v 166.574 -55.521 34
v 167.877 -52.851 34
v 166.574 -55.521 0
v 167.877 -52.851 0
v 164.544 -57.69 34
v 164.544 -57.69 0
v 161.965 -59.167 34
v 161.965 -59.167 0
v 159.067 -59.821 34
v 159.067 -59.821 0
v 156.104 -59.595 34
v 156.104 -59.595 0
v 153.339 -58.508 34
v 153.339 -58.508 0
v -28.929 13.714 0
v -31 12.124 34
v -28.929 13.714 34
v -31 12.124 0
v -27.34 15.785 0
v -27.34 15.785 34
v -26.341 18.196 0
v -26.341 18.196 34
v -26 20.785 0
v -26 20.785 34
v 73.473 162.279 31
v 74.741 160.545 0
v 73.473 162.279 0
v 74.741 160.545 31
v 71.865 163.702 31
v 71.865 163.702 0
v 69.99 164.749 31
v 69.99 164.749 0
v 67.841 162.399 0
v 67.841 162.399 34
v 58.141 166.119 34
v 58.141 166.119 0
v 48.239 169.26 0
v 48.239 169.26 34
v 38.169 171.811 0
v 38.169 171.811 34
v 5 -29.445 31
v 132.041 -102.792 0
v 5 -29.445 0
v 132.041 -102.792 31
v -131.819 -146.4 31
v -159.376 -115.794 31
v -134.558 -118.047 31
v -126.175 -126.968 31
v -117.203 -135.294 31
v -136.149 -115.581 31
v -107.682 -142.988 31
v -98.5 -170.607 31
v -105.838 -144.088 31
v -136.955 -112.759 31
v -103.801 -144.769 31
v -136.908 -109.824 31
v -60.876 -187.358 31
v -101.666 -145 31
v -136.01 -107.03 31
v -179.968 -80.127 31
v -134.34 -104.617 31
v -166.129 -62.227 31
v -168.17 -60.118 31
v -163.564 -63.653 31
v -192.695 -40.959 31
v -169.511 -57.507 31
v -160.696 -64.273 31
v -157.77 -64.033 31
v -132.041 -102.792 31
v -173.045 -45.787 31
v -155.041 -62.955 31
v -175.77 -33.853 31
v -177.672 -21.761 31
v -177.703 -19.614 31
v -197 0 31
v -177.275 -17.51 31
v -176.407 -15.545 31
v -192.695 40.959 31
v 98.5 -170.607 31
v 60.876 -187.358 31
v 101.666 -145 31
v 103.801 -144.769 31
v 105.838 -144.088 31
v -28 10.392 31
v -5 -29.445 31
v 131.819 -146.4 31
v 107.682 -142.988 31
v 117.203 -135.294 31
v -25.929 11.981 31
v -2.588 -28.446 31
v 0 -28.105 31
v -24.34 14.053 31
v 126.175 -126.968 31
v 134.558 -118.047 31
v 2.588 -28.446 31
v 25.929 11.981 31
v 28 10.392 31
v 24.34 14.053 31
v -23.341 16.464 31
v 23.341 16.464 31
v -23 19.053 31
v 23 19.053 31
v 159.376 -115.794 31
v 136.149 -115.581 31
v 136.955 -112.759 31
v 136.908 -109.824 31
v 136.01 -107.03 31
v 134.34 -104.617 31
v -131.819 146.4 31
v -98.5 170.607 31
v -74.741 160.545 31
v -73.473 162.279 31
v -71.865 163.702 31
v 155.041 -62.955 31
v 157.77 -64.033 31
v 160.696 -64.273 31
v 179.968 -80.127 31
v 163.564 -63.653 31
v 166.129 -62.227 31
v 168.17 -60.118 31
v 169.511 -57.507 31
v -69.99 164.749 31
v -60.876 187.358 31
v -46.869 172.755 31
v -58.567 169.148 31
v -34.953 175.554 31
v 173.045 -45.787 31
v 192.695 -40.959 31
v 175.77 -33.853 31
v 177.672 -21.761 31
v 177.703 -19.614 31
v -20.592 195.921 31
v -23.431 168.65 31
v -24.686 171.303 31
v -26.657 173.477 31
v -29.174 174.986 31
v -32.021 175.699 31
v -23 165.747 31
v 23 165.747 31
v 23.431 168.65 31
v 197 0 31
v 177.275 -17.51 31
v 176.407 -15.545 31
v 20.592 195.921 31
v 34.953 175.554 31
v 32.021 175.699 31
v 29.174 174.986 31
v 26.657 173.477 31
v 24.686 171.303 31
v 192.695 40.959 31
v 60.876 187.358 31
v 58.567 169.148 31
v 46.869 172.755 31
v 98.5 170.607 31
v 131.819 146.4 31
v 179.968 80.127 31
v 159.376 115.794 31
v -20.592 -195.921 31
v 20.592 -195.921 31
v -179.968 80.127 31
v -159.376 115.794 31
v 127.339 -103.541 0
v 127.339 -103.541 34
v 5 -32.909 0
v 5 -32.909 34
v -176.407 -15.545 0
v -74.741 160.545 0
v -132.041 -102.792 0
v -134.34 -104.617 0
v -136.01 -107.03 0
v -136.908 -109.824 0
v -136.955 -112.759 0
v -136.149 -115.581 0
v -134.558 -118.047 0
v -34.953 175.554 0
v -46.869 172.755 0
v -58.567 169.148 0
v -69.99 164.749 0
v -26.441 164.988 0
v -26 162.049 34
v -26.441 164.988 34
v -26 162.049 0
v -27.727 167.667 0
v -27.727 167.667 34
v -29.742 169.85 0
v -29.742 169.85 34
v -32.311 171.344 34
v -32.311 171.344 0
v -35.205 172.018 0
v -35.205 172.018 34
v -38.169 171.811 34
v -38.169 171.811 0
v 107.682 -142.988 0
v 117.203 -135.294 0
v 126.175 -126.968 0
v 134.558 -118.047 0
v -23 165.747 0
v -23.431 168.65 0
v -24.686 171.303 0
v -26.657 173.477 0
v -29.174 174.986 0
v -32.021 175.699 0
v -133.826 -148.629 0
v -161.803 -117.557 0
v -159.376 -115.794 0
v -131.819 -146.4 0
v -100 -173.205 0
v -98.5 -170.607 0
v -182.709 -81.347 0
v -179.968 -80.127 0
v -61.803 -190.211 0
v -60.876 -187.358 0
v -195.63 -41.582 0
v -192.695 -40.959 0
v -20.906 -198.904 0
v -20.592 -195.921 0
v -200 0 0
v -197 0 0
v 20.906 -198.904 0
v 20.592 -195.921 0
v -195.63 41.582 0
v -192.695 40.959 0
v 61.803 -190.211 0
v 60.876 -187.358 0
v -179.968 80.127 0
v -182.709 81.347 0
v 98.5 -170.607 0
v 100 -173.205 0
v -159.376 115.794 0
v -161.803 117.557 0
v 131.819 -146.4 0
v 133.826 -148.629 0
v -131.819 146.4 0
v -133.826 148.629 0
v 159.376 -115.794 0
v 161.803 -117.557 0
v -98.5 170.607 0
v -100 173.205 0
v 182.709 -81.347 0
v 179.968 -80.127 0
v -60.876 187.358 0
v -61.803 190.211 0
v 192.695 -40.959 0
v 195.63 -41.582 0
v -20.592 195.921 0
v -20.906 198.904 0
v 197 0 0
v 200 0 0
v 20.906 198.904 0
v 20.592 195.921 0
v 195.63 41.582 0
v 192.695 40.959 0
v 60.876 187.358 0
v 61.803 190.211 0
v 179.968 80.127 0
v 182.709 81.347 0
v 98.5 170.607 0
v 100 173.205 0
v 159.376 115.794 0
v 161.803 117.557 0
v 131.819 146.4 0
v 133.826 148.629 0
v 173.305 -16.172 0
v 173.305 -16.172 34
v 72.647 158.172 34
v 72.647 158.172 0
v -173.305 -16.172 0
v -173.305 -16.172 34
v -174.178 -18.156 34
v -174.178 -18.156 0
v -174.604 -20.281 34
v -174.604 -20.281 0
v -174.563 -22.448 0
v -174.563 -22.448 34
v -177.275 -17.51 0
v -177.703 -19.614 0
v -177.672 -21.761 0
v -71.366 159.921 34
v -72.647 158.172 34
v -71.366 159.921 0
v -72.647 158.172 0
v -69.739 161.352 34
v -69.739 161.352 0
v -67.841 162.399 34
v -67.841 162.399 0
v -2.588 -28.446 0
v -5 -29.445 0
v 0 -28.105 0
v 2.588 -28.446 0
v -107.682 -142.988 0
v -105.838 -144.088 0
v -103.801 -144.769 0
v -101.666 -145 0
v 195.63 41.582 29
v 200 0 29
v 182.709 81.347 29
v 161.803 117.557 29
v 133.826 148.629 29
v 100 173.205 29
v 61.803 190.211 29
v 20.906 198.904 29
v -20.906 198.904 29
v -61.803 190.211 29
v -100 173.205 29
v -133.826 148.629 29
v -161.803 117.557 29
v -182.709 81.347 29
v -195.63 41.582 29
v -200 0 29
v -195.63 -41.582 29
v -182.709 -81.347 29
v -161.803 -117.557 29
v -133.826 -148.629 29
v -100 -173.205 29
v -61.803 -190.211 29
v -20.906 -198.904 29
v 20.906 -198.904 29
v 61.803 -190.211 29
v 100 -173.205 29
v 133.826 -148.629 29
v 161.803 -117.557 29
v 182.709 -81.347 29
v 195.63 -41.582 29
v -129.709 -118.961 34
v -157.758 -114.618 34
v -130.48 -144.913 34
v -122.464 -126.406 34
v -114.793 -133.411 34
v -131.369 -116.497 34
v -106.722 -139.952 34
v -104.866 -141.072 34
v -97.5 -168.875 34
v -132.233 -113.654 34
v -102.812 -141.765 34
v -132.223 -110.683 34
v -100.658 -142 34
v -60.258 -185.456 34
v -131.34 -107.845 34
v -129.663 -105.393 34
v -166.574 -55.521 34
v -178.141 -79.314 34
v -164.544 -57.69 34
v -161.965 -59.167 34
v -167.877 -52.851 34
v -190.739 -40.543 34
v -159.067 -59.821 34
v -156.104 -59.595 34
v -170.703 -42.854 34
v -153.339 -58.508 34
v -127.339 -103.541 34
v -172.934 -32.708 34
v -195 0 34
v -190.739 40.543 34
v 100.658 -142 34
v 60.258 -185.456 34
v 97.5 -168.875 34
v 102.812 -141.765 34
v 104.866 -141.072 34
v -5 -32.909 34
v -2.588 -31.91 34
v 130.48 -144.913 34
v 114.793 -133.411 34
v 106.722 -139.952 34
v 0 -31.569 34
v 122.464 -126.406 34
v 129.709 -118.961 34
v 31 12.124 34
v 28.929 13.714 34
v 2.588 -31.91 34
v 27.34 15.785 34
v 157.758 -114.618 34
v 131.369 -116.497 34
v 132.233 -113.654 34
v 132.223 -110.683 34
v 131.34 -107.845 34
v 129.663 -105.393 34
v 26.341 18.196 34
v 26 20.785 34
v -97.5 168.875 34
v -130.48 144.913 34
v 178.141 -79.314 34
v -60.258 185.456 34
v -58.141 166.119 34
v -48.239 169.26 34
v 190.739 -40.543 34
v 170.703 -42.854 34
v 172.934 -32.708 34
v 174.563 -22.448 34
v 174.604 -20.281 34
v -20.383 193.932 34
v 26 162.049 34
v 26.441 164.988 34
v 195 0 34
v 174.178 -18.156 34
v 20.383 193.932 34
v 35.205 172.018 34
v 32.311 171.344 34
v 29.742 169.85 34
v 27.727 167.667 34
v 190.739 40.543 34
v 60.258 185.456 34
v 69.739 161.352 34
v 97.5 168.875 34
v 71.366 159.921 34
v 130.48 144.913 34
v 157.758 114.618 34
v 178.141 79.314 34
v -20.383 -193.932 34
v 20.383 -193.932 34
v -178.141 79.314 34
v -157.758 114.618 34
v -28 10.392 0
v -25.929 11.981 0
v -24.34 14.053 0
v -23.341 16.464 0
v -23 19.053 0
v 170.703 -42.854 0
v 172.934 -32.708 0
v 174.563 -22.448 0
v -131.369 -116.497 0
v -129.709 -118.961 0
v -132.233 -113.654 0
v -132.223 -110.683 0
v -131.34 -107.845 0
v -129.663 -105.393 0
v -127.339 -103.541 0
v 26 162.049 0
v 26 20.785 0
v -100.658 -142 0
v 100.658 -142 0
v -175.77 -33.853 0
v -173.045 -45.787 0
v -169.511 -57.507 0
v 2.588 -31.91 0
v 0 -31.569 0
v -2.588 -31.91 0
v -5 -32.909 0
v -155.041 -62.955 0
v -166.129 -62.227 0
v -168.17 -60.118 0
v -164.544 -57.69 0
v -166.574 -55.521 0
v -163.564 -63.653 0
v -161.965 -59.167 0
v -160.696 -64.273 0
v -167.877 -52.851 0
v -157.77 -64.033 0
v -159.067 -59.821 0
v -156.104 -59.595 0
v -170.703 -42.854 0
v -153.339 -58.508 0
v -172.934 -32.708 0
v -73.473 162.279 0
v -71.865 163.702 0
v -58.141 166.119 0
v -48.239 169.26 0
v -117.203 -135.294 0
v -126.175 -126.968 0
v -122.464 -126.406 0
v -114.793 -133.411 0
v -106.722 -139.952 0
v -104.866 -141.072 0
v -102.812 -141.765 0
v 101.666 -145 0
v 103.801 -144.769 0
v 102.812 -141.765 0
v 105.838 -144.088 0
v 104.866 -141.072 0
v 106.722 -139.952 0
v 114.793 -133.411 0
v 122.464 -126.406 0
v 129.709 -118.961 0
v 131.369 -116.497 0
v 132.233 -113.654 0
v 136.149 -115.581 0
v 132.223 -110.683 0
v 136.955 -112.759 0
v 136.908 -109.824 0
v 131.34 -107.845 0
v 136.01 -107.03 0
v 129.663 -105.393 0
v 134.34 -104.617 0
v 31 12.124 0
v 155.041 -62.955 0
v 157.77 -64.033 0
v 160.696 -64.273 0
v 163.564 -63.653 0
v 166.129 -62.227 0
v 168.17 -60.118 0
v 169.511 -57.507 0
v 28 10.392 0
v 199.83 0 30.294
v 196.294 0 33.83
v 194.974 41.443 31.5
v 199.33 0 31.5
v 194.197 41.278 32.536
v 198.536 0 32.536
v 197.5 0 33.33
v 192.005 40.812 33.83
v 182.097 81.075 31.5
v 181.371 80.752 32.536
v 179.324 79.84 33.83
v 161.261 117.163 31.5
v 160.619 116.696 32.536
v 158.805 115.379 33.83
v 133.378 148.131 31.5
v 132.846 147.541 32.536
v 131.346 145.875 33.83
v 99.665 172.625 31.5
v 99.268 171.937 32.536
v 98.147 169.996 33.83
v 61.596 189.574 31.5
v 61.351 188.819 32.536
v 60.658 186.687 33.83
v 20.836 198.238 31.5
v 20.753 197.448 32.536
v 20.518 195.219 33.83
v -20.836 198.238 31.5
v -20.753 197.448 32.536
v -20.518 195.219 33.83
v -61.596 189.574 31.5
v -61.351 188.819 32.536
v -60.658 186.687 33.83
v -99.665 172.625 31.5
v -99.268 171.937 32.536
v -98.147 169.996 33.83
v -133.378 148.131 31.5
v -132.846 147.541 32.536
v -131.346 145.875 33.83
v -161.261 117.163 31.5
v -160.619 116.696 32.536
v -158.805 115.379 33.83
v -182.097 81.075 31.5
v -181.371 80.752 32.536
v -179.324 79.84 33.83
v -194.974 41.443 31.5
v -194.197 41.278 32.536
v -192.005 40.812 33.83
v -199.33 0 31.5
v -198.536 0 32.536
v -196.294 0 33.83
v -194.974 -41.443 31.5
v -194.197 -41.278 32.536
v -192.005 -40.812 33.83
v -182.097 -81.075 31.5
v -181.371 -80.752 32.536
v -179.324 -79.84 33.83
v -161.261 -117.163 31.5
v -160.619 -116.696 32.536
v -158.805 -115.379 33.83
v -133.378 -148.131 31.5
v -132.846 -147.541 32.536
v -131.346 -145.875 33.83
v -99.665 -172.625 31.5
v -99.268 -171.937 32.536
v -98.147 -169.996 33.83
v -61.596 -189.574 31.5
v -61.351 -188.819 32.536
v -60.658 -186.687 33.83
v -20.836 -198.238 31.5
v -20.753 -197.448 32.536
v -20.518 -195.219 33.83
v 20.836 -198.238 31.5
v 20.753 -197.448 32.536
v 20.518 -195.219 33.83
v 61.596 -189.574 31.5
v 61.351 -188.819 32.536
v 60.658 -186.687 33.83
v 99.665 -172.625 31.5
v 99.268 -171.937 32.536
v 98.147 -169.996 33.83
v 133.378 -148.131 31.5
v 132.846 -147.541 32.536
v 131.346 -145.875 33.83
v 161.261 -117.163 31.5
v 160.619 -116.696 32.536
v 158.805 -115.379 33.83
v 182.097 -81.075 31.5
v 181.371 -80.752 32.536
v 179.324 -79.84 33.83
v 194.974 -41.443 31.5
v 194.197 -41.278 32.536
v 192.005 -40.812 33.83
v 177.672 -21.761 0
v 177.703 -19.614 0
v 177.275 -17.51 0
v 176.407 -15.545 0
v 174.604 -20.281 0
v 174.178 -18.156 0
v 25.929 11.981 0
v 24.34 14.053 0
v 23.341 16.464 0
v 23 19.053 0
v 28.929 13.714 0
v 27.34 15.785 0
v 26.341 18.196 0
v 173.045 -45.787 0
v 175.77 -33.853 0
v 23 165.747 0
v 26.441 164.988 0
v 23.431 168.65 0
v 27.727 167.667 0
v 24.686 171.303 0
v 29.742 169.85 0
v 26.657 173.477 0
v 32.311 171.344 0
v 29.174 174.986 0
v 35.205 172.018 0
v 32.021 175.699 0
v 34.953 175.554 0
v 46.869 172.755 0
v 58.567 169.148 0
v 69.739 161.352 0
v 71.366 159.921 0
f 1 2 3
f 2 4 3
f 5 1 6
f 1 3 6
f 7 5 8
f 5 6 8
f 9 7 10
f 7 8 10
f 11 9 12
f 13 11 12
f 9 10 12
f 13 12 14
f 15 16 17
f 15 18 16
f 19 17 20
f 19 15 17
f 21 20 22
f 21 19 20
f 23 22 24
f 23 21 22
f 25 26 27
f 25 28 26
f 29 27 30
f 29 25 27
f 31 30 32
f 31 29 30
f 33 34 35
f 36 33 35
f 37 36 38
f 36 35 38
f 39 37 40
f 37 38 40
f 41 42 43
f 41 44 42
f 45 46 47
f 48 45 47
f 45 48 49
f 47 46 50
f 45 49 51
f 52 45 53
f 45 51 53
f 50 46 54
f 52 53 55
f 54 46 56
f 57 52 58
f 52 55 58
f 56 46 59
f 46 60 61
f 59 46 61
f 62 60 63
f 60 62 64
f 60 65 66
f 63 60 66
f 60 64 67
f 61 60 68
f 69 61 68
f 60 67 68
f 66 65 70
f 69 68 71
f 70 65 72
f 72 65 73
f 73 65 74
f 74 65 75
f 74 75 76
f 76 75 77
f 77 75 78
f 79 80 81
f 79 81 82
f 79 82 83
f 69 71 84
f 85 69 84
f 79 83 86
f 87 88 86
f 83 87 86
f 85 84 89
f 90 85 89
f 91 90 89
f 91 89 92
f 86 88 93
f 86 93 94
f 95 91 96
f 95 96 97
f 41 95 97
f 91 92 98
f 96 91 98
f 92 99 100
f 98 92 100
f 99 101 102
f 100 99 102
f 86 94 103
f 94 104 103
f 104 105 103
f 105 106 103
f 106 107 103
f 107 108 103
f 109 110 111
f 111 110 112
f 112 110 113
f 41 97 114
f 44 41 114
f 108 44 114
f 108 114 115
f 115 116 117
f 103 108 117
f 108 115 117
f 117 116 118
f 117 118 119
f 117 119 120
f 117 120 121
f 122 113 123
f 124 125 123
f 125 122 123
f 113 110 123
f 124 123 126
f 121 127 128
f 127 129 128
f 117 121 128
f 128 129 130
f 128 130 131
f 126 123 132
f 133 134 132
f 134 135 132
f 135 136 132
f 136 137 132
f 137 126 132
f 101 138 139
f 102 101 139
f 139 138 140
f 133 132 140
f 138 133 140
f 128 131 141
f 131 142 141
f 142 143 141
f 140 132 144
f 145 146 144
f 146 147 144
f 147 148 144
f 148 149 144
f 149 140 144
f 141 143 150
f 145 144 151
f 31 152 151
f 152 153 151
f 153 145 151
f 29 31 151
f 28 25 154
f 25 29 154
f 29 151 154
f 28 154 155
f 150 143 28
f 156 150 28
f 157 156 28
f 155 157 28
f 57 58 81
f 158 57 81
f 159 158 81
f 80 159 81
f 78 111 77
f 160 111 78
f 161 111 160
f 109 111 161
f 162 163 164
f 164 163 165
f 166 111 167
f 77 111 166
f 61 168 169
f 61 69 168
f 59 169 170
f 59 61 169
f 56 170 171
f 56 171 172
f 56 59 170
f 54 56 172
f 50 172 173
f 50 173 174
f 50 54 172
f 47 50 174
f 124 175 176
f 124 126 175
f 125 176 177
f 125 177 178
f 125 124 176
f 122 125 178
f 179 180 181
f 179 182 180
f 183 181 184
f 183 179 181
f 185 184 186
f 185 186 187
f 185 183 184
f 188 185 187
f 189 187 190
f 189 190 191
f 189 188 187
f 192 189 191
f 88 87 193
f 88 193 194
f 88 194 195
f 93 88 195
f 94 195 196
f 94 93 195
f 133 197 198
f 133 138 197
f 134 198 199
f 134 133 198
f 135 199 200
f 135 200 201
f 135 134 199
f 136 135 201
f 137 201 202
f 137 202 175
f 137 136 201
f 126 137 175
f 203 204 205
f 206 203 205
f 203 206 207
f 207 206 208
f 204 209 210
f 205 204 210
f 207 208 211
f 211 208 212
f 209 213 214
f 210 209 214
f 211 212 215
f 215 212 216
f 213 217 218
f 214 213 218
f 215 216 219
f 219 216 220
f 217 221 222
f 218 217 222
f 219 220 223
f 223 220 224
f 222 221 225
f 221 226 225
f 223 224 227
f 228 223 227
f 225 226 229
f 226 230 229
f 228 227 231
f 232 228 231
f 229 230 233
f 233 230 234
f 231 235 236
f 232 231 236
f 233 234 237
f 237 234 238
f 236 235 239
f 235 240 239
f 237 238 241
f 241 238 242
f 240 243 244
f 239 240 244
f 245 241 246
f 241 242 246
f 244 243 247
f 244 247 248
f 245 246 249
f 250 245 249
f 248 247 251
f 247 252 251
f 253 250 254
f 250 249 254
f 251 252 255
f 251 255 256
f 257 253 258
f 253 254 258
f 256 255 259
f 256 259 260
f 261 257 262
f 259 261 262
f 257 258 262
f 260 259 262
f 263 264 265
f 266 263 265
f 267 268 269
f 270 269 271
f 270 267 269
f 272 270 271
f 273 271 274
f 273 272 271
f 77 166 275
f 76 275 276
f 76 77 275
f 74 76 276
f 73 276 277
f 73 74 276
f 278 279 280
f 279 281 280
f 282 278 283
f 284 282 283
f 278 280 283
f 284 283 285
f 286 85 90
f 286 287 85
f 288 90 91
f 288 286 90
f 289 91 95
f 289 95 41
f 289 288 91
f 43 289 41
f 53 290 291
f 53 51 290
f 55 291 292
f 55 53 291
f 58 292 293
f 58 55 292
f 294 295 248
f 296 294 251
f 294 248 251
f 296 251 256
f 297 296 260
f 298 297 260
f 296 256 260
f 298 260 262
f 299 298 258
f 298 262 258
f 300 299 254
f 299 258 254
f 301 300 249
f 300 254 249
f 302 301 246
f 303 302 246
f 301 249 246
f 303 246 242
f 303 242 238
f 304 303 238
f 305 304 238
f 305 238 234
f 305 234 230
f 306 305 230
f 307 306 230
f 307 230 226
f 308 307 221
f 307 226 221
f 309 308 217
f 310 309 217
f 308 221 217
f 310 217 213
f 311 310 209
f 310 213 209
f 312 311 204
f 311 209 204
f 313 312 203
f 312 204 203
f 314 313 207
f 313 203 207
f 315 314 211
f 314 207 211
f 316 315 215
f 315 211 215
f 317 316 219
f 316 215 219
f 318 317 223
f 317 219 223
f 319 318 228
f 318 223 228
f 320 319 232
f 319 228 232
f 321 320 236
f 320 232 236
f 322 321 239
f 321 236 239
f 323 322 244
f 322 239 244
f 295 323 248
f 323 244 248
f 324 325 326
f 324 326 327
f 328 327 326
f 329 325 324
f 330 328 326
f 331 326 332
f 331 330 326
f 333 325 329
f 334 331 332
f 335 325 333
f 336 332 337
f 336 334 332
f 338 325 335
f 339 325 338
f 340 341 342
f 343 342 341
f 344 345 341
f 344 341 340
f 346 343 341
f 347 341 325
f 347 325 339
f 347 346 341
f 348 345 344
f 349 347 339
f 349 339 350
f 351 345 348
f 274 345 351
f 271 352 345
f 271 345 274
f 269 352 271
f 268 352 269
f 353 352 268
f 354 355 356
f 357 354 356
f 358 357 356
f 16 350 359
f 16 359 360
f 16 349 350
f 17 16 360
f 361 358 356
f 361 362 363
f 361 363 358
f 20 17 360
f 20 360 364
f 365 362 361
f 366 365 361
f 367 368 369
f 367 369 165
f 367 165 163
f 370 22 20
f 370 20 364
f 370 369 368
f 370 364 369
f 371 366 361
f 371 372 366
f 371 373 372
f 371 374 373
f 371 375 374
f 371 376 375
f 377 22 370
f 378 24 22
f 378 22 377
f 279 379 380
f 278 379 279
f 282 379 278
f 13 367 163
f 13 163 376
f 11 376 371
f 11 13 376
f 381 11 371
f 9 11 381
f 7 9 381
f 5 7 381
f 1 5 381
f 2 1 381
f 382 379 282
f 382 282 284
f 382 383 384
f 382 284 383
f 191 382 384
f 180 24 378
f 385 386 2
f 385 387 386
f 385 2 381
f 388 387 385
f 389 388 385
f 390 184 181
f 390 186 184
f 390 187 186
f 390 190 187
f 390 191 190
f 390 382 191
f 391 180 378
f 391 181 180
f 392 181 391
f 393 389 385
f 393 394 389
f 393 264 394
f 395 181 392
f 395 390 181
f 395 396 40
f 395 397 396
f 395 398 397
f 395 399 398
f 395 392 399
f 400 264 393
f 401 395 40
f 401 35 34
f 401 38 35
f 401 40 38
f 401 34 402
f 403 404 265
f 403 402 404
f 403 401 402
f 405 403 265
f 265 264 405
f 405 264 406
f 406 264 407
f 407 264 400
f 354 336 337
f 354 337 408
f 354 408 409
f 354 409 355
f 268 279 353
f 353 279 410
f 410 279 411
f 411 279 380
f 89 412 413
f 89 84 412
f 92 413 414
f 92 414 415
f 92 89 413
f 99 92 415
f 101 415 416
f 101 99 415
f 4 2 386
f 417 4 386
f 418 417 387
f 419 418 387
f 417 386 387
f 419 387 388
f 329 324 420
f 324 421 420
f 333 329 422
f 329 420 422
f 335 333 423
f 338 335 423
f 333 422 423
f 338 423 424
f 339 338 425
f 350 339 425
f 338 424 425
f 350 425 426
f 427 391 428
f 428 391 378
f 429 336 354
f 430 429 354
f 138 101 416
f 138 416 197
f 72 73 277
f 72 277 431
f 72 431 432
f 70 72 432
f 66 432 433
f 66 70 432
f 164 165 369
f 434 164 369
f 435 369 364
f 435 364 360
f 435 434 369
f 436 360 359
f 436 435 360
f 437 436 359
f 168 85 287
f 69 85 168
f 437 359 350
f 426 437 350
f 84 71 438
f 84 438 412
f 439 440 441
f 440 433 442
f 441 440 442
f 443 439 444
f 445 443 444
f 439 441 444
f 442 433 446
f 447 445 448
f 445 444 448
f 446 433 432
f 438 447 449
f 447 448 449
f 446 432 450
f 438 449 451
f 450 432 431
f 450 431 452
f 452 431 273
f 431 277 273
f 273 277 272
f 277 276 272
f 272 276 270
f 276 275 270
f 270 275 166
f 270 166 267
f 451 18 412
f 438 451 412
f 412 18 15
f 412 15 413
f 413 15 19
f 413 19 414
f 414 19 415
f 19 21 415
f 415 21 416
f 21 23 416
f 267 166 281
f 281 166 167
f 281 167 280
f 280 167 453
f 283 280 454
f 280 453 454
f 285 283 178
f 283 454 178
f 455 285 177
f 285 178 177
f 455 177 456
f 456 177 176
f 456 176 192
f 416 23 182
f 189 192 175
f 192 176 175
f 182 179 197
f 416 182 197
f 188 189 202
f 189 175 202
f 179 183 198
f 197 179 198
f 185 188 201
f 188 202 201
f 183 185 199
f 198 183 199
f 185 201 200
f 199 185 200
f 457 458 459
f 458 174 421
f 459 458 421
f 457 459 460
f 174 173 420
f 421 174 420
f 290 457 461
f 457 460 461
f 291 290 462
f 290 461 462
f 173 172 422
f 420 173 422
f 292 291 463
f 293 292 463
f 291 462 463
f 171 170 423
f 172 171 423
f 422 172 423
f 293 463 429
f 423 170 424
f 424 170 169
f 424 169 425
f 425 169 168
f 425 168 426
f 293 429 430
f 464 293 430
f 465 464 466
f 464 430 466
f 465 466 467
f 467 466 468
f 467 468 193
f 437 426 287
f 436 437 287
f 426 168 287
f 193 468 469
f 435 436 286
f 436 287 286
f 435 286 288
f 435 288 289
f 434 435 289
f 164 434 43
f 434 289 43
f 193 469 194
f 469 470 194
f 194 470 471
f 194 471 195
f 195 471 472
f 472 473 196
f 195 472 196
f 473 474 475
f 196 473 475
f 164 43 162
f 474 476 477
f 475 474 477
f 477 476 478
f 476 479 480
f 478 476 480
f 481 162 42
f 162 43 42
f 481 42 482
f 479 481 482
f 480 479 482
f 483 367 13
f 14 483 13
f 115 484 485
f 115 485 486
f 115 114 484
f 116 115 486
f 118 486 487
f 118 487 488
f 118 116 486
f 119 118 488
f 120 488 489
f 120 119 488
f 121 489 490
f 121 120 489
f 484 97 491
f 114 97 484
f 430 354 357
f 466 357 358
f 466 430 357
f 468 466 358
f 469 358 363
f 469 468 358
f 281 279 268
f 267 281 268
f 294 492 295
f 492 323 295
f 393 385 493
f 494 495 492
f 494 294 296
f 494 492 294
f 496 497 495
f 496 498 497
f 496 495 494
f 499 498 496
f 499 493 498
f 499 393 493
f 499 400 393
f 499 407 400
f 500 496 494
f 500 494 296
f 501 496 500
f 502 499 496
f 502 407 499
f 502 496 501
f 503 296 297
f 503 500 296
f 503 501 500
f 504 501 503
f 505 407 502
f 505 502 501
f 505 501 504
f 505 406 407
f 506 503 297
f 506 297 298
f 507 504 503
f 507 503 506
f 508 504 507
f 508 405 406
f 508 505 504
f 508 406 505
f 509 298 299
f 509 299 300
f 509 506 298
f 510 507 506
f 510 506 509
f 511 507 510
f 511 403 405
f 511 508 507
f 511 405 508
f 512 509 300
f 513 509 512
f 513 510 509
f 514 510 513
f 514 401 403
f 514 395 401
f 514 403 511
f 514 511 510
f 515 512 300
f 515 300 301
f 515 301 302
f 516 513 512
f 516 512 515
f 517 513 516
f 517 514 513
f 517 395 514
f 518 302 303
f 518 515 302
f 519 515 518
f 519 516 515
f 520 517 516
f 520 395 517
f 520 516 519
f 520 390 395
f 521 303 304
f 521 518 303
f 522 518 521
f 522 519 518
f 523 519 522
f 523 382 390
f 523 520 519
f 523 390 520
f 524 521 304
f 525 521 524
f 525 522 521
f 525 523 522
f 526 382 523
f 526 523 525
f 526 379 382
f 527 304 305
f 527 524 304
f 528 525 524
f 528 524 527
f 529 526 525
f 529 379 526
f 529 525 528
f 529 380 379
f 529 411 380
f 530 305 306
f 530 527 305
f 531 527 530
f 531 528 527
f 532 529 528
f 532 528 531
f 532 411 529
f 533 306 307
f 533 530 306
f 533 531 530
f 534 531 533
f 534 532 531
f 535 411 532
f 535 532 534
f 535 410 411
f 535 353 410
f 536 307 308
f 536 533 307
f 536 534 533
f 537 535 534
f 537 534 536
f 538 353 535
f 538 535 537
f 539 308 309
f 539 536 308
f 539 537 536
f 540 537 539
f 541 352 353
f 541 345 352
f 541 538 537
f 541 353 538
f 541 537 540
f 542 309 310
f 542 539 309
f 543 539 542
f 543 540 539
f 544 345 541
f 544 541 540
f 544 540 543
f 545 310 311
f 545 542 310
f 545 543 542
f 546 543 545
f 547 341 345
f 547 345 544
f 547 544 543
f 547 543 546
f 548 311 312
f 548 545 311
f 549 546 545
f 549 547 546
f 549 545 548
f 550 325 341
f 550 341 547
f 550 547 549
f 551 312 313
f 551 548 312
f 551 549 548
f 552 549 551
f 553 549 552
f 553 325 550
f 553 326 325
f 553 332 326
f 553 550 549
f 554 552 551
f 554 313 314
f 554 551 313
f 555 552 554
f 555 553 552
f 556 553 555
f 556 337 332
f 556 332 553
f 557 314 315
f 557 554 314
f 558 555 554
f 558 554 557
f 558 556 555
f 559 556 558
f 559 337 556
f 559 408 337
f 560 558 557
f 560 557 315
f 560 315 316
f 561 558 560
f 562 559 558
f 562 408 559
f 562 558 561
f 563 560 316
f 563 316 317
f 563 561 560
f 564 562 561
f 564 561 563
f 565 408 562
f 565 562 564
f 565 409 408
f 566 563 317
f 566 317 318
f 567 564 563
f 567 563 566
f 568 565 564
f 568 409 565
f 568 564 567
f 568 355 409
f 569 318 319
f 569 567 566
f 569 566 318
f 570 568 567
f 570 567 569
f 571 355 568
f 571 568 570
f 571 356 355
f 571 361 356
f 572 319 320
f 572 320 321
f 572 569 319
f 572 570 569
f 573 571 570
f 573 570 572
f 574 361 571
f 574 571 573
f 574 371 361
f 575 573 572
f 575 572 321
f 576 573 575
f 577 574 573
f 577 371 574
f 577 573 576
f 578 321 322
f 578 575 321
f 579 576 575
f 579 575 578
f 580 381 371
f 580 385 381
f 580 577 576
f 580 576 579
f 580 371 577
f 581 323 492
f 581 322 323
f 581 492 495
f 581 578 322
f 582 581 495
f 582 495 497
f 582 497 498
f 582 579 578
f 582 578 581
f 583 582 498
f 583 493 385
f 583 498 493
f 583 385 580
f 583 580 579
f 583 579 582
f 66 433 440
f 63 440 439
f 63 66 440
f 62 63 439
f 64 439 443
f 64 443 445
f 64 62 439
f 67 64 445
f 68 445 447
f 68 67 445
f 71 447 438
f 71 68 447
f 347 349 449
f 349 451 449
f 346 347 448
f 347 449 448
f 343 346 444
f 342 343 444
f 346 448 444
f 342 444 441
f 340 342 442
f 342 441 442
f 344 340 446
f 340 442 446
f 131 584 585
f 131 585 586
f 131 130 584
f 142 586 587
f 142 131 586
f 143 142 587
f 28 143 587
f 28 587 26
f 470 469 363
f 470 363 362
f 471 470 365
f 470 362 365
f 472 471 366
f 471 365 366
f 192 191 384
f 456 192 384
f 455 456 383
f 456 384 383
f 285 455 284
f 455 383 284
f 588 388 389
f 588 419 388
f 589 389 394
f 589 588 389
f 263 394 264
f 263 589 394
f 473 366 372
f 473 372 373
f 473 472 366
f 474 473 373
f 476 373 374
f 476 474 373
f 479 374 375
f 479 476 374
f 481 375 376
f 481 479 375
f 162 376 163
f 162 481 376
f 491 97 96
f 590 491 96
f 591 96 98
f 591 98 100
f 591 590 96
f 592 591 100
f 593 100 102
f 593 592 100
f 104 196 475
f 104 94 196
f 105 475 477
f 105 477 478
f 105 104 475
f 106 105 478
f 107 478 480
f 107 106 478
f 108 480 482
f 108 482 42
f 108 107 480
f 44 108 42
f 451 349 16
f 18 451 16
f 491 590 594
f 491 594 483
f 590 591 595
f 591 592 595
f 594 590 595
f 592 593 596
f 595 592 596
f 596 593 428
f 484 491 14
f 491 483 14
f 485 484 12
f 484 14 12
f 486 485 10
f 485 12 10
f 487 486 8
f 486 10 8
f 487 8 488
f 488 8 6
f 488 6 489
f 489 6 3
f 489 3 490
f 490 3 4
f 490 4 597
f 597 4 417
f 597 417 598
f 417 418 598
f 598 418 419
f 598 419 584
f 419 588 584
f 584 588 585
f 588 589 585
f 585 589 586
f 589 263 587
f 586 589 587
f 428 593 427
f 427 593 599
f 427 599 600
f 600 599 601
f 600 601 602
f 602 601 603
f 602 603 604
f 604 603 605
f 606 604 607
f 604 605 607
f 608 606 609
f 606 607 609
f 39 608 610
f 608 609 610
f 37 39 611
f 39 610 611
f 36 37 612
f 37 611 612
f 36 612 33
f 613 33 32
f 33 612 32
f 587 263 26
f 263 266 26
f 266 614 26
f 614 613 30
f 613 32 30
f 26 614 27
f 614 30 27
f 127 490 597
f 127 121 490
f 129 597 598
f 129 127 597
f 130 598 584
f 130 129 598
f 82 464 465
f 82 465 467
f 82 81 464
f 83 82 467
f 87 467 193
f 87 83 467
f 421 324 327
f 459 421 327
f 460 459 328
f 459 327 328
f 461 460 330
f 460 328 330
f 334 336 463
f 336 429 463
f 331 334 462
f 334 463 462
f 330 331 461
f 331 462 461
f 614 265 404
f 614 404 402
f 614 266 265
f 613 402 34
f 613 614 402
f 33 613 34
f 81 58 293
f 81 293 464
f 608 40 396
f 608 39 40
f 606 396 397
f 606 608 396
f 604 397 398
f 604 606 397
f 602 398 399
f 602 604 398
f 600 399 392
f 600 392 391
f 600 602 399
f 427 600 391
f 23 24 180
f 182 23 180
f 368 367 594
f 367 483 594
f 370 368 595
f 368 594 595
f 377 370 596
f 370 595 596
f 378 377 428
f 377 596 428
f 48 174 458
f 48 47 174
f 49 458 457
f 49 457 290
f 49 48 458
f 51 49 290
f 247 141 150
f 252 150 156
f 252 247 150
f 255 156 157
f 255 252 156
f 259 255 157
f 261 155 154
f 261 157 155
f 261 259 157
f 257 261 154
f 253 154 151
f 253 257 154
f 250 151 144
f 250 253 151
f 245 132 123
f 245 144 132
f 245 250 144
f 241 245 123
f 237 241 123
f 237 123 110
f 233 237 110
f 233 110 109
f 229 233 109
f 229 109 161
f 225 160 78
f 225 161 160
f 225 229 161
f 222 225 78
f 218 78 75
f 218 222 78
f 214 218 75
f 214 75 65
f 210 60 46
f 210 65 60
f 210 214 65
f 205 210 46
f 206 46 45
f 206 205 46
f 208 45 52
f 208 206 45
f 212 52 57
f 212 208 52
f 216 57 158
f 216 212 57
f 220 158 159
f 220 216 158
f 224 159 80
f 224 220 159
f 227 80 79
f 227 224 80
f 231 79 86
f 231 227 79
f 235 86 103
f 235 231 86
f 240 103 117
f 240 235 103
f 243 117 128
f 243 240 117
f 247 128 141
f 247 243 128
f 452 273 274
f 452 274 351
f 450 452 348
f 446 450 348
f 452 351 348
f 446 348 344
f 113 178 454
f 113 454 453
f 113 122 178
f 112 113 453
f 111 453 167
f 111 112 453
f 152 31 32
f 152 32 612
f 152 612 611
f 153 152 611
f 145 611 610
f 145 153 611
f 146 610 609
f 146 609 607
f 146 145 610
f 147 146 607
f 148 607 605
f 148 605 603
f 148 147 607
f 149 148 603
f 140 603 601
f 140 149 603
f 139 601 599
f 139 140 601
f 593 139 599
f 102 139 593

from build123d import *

# Parameters (mm, degrees)
ESBO_O2_R             = 200
EXTRUS_O2_DEPTH       = 34
EXTRUS_O3_DEPTH       = 35
PADR_OCIRCULAR1_COUNT = 3
CASCA1_T              = -3
FILETE1_R             = 10
FILETE2_R             = 10
FILETE3_R             = 10
FILETE4_R             = 10
FILETE5_R             = 10
FILETE6_R             = 10
FILETE7_R             = 10
FILETE8_R             = 10
FILETE9_R             = 10
FILETE10_R            = 10
FILETE11_R            = 10
FILETE12_R            = 10
FILETE13_R            = 10
FILETE14_R            = 10
FILETE15_R            = 10
FILETE16_R            = 10
FILETE17_R            = 10
FILETE18_R            = 10
FILETE19_R            = 5


with BuildPart() as part:
    # Esboço2 → Extrusão2 (new body)
    with BuildSketch(Plane.XY):
        Circle(ESBO_O2_R)
    extrude(amount=EXTRUS_O2_DEPTH)

    # Esboço4 → Extrusão3 (cut, through all)
    with BuildSketch(Plane.XY.offset(34)):
        with BuildLine():
            Line((-103.980767452, -142), (103.980767452, -142))
            ThreePointArc((103.980767452, -142), (121.948545192, -126.903712812), (137.748134317, -109.551136426))
            Line((137.748134317, -109.551136426), (0, -30.022213998))
            Line((0, -30.022213998), (-137.748134317, -109.551136426))
            ThreePointArc((-137.748134317, -109.551136426), (-121.948545192, -126.903712812), (-103.980767452, -142))
        make_face()
    extrus_o3 = extrude(amount=-EXTRUS_O3_DEPTH, mode=Mode.SUBTRACT)

    # PadrãoCircular1: Extrusão3 ×3 about axis
    padr_ocircular1_axis = Axis((0, 0, 0), (0, 0, 1))
    for i in range(1, PADR_OCIRCULAR1_COUNT):
        add(extrus_o3.rotate(padr_ocircular1_axis, i * 360 / PADR_OCIRCULAR1_COUNT), mode=Mode.SUBTRACT)

    # Casca1
    casca1_openings = [part.faces().sort_by_distance(p)[0] for p in [
        (92.730670551, 53.538077605, 0),
    ]]
    offset(amount=CASCA1_T, openings=casca1_openings, kind=Kind.INTERSECTION)

    # Filete1
    filete1_edges = [part.edges().sort_by_distance(p)[0] for p in [
        (-137.748134317, -109.551136426, 17),
    ]]
    fillet(filete1_edges, radius=FILETE1_R)

    # Filete2
    filete2_edges = [part.edges().sort_by_distance(p)[0] for p in [
        (137.748134317, -109.551136426, 17),
    ]]
    fillet(filete2_edges, radius=FILETE2_R)

    # Filete3
    filete3_edges = [part.edges().sort_by_distance(p)[0] for p in [
        (-26, 174.068951855, 17),
    ]]
    fillet(filete3_edges, radius=FILETE3_R)

    # Filete4
    filete4_edges = [part.edges().sort_by_distance(p)[0] for p in [
        (-163.748134317, -64.517815429, 17),
    ]]
    fillet(filete4_edges, radius=FILETE4_R)

    # Filete5
    filete5_edges = [part.edges().sort_by_distance(p)[0] for p in [
        (26, 174.068951855, 17),
    ]]
    fillet(filete5_edges, radius=FILETE5_R)

    # Filete6
    filete6_edges = [part.edges().sort_by_distance(p)[0] for p in [
        (163.748134317, -64.517815429, 17),
    ]]
    fillet(filete6_edges, radius=FILETE6_R)

    # Filete7
    filete7_edges = [part.edges().sort_by_distance(p)[0] for p in [
        (0, -30.022213998, 17),
    ]]
    fillet(filete7_edges, radius=FILETE7_R)

    # Filete8
    filete8_edges = [part.edges().sort_by_distance(p)[0] for p in [
        (-26, 15.011106999, 17),
    ]]
    fillet(filete8_edges, radius=FILETE8_R)

    # Filete9
    filete9_edges = [part.edges().sort_by_distance(p)[0] for p in [
        (26, 15.011106999, 17),
    ]]
    fillet(filete9_edges, radius=FILETE9_R)

    # Filete10
    filete10_edges = [part.edges().sort_by_distance(p)[0] for p in [
        (-70.985223611, 161.049986119, 17),
    ]]
    fillet(filete10_edges, radius=FILETE10_R)

    # Filete11
    filete11_edges = [part.edges().sort_by_distance(p)[0] for p in [
        (-174.965991064, -19.049986119, 17),
    ]]
    fillet(filete11_edges, radius=FILETE11_R)

    # Filete12
    filete12_edges = [part.edges().sort_by_distance(p)[0] for p in [
        (-103.980767452, -142, 17),
    ]]
    fillet(filete12_edges, radius=FILETE12_R)

    # Filete13
    filete13_edges = [part.edges().sort_by_distance(p)[0] for p in [
        (103.980767452, -142, 17),
    ]]
    fillet(filete13_edges, radius=FILETE13_R)

    # Filete14
    filete14_edges = [part.edges().sort_by_distance(p)[0] for p in [
        (174.965991064, -19.049986119, 17),
    ]]
    fillet(filete14_edges, radius=FILETE14_R)

    # Filete15
    filete15_edges = [part.edges().sort_by_distance(p)[0] for p in [
        (70.985223611, 161.049986119, 17),
    ]]
    fillet(filete15_edges, radius=FILETE15_R)

    # Filete16
    filete16_edges = [part.edges().sort_by_distance(p)[0] for p in [
        (-142.233535704, -108.676682509, 15.5),
        (0, -26.558112383, 15.5),
        (-104.957134107, -145, 15.5),
        (-165.233535704, -68.839513935, 15.5),
        (-178.052250602, -18.395544445, 15.5),
        (-73.095116495, 163.395544445, 15.5),
        (165.233535704, -68.839513935, 15.5),
        (23, 13.279056191, 15.5),
        (23, 177.516196444, 15.5),
    ]]
    fillet(filete16_edges, radius=FILETE16_R)

    # Filete17
    filete17_edges = [part.edges().sort_by_distance(p)[0] for p in [
        (142.233535704, -108.676682509, 15.5),
        (104.957134107, -145, 15.5),
        (-23, 177.516196444, 15.5),
        (-23, 13.279056191, 15.5),
    ]]
    fillet(filete17_edges, radius=FILETE17_R)

    # Filete18
    filete18_edges = [part.edges().sort_by_distance(p)[0] for p in [
        (73.095116495, 163.395544445, 15.5),
        (178.052250602, -18.395544445, 15.5),
    ]]
    fillet(filete18_edges, radius=FILETE18_R)

    # Filete19
    filete19_edges = [part.edges().sort_by_distance(p)[0] for p in [
        (-200, 0, 34),
    ]]
    fillet(filete19_edges, radius=FILETE19_R)


solid = part.part
